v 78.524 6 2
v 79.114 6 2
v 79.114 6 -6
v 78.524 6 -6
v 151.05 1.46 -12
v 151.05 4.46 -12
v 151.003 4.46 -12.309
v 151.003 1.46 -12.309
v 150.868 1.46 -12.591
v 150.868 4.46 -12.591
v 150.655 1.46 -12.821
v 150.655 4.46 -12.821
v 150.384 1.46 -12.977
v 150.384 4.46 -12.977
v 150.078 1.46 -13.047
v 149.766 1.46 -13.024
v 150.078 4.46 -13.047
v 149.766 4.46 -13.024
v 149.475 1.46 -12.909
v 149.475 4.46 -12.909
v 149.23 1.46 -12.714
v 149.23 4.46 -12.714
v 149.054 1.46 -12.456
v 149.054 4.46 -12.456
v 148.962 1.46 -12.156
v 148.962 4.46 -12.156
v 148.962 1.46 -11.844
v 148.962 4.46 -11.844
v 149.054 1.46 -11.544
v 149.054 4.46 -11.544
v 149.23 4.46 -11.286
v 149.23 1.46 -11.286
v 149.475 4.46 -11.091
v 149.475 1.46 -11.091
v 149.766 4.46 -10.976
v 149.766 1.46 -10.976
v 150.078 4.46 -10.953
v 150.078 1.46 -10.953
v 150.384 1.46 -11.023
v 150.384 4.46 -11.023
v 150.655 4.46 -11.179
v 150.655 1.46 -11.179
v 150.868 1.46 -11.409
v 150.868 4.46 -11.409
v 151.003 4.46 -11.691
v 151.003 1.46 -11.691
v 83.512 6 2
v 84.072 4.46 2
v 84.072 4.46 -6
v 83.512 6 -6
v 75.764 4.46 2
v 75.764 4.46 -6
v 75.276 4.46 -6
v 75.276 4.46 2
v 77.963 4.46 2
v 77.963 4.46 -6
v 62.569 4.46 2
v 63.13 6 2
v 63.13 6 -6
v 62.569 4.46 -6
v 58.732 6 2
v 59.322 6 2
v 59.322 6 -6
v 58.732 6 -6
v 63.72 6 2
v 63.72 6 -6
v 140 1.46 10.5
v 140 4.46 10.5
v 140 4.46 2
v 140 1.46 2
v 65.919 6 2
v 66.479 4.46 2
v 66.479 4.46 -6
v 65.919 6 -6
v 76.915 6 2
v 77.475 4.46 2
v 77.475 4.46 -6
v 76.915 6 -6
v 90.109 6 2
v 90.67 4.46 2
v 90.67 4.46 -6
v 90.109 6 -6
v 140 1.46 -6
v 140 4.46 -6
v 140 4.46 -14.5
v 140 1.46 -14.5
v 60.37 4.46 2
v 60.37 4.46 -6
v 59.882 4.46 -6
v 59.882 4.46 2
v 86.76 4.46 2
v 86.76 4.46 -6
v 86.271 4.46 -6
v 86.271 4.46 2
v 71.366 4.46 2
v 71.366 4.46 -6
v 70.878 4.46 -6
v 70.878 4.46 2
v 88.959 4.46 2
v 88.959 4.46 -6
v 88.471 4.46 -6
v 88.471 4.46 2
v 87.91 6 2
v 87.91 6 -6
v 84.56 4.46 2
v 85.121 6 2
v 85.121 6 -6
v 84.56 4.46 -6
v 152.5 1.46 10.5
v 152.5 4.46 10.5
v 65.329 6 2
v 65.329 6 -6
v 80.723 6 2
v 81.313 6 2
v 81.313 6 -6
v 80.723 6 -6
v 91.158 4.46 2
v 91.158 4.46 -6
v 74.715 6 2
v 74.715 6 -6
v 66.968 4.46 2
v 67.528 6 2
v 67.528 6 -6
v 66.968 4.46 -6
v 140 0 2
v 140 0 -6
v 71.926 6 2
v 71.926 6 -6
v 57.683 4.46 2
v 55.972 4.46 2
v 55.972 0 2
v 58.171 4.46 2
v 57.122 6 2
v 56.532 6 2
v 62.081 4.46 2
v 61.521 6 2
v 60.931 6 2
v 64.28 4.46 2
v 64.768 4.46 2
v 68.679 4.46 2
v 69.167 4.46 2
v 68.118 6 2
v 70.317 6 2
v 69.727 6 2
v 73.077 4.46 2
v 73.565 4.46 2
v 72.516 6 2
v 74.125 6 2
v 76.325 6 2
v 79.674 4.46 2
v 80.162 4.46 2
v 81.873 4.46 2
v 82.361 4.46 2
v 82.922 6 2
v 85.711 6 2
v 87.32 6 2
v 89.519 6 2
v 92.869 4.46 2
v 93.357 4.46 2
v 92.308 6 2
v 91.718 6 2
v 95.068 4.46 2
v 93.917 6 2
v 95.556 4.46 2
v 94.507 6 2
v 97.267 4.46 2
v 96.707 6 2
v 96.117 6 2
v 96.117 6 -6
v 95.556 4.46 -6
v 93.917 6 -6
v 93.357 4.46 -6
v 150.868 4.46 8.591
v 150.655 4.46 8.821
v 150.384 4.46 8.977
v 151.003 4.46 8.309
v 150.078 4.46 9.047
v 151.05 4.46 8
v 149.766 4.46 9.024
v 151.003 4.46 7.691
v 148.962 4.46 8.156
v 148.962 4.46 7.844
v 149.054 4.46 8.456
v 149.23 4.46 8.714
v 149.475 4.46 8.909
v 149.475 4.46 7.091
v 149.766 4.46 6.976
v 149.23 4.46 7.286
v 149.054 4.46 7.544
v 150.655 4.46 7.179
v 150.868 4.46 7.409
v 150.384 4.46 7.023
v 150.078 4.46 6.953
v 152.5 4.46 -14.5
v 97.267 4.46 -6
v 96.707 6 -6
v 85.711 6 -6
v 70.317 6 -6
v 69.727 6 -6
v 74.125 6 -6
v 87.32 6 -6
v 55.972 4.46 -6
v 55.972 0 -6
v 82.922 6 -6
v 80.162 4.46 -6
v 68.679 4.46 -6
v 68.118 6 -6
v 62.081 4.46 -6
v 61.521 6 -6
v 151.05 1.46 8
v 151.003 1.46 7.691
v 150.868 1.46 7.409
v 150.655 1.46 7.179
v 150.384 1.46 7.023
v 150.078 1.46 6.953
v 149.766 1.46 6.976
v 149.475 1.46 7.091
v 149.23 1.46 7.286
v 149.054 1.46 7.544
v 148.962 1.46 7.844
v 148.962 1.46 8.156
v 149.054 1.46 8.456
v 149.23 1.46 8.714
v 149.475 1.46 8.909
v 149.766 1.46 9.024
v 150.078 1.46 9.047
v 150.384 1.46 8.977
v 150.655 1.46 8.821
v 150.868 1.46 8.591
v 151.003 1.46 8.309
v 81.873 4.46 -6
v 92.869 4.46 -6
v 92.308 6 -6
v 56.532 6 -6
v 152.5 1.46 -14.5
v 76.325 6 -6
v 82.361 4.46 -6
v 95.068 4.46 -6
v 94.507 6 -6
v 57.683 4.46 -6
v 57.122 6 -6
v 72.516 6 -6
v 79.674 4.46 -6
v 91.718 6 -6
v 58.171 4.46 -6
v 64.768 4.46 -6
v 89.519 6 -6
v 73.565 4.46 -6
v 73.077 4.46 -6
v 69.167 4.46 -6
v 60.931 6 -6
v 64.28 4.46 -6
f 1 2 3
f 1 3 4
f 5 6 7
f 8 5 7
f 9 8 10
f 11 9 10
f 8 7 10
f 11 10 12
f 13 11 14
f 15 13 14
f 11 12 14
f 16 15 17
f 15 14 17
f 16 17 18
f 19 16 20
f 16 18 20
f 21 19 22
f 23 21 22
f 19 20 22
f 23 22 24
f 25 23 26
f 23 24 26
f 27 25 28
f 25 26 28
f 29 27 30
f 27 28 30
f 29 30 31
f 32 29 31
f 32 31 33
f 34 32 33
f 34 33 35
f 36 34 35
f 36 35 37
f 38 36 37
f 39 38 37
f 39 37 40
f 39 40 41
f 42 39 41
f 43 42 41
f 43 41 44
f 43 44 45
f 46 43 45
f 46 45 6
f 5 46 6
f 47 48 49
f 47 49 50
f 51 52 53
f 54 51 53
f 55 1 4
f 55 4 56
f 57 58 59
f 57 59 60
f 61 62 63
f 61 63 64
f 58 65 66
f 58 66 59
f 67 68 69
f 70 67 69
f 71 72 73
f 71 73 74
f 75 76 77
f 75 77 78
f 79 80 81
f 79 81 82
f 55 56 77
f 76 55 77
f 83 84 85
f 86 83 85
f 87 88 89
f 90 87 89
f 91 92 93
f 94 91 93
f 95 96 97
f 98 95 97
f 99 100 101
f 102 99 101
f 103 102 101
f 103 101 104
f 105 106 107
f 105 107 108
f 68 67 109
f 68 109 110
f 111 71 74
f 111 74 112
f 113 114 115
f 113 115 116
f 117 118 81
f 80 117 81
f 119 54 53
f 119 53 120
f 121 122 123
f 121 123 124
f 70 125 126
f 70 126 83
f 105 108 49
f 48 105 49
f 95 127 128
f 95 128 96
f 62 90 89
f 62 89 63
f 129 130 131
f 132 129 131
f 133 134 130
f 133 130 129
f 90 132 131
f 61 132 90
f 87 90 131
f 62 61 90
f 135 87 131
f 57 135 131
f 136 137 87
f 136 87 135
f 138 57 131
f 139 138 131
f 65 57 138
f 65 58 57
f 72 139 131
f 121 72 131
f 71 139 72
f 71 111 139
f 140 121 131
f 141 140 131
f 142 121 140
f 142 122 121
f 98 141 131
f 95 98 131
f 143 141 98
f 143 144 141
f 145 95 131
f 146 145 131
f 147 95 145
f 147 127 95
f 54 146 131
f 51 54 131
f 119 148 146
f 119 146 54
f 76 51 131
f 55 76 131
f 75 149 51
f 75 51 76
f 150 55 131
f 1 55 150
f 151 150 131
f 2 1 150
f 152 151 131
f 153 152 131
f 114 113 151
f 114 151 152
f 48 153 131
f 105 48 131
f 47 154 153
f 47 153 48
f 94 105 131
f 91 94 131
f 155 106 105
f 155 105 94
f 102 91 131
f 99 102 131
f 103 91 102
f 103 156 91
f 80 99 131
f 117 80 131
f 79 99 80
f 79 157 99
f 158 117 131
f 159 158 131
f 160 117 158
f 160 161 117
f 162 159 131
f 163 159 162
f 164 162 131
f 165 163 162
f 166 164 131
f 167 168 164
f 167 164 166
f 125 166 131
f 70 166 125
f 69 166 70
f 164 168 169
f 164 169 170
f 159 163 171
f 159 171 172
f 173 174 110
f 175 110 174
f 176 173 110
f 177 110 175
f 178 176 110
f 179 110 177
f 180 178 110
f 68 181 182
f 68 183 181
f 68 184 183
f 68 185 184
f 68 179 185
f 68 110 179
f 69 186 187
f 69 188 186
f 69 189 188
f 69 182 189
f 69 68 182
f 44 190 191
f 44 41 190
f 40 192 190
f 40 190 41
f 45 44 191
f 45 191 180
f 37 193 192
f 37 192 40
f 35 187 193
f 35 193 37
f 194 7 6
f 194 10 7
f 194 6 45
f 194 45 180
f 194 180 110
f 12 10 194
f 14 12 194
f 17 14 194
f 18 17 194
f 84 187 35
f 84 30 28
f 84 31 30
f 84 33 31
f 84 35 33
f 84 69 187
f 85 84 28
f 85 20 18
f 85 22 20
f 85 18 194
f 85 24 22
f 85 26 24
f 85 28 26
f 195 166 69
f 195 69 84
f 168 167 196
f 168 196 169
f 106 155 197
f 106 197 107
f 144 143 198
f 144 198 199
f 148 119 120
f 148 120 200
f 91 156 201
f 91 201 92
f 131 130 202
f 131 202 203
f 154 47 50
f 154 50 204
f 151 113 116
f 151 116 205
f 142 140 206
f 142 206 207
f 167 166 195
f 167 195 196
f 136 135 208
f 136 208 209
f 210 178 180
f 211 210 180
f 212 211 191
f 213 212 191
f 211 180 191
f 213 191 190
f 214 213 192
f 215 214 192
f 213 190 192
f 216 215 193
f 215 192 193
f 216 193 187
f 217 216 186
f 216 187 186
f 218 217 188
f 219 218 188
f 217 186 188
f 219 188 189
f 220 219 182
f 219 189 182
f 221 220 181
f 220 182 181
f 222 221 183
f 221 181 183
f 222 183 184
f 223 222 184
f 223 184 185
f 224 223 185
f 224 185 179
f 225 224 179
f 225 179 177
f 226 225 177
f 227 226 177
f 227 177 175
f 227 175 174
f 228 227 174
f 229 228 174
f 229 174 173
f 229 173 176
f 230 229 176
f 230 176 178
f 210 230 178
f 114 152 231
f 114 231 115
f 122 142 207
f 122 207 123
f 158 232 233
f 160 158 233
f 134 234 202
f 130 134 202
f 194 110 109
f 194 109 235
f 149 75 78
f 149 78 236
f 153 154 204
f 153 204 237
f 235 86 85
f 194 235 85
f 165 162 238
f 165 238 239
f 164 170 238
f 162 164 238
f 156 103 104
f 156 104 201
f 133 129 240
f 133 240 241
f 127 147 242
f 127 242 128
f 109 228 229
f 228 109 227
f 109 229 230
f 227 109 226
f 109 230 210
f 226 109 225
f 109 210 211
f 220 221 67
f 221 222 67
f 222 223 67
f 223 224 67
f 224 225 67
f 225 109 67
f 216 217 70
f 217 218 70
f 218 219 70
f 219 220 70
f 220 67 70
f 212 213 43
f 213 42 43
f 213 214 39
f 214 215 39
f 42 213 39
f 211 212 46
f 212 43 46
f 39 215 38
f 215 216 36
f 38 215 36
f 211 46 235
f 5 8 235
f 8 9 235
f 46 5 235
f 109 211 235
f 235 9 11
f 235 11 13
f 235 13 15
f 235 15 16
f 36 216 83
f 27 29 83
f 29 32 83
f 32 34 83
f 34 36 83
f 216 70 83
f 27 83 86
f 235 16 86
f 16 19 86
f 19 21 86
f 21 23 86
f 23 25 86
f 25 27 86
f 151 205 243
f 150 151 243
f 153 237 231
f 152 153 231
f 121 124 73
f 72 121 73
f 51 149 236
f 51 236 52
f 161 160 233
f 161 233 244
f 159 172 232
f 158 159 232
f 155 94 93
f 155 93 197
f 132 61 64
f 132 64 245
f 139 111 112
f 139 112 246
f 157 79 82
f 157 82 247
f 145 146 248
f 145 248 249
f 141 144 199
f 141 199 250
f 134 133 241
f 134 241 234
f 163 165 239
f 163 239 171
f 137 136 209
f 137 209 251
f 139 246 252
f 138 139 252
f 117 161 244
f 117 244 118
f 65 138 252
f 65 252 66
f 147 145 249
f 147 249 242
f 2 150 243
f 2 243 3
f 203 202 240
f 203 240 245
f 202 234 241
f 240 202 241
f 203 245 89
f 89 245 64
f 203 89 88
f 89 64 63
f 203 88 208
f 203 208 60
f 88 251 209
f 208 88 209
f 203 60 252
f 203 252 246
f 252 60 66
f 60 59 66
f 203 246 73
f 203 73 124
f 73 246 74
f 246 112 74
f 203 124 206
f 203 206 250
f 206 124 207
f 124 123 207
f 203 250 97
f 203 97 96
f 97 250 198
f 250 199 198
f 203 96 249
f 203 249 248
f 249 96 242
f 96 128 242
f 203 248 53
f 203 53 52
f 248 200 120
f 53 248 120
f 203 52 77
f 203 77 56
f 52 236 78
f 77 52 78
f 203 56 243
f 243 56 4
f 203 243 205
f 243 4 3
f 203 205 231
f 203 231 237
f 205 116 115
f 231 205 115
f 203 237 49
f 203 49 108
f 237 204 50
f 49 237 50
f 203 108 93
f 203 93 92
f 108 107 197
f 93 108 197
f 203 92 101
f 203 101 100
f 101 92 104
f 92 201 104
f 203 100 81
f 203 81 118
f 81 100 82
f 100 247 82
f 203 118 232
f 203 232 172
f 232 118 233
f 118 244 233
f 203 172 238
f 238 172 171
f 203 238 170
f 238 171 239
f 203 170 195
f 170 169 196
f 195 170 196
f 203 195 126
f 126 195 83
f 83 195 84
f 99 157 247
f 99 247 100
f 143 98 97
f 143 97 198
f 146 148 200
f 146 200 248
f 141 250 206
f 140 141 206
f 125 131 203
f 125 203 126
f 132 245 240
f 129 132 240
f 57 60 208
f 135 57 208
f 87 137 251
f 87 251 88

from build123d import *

# Parameters (mm, degrees)
BOSS_EXTRU_1_DEPTH      = 8
ESQUISSE3_W             = 25
ESQUISSE3_H             = 3
BOSS_EXTRU_3_DEPTH      = 12.5
ESQUISSE4_R             = 1.05
ENL_V_MAT_EXTRU_1_DEPTH = 10
ESQUISSE7_W             = 13.702754964
ESQUISSE7_H             = 7.283651796
ENL_V_MAT_EXTRU_2_DEPTH = 55


with BuildPart() as part:
    # Esquisse1 → Boss.-Extru.1 (new body)
    with BuildSketch(Plane.XY.offset(2)):
        Polygon((55.971983753, 0), (140, 0), (140, 4.46), (139.050191247, 4.46), (138.489677086, 6), (137.899678914, 6), (137.339164753, 4.46), (136.851078247, 4.46), (136.290564086, 6), (135.700565914, 6), (135.140051753, 4.46), (134.651965247, 4.46), (134.091451086, 6), (133.501452914, 6), (132.940938753, 4.46), (132.452852247, 4.46), (131.892338086, 6), (131.302339914, 6), (130.741825753, 4.46), (130.253739247, 4.46), (129.693225086, 6), (129.103226914, 6), (128.542712753, 4.46), (128.054626247, 4.46), (127.494112086, 6), (126.904113914, 6), (126.343599753, 4.46), (125.855513247, 4.46), (125.294999086, 6), (124.705000914, 6), (124.144486753, 4.46), (123.656400247, 4.46), (123.095886086, 6), (122.505887914, 6), (121.945373753, 4.46), (121.457287247, 4.46), (120.896773086, 6), (120.306774914, 6), (119.746260753, 4.46), (119.258174247, 4.46), (118.697660086, 6), (118.107661914, 6), (117.547147753, 4.46), (117.059061247, 4.46), (116.498547086, 6), (115.908548914, 6), (115.348034753, 4.46), (114.859948247, 4.46), (114.299434086, 6), (113.709435914, 6), (113.148921753, 4.46), (112.660835247, 4.46), (112.100321086, 6), (111.510322914, 6), (110.949808753, 4.46), (110.461722247, 4.46), (109.901208086, 6), (109.311209914, 6), (108.750695753, 4.46), (108.262609247, 4.46), (107.702095086, 6), (107.112096914, 6), (106.551582753, 4.46), (106.063496247, 4.46), (105.502982086, 6), (104.912983914, 6), (104.352469753, 4.46), (103.864383247, 4.46), (103.303869086, 6), (102.713870914, 6), (102.153356753, 4.46), (101.665270247, 4.46), (101.104756086, 6), (100.514757914, 6), (99.954243753, 4.46), (99.466157247, 4.46), (98.905643086, 6), (98.315644914, 6), (97.755130753, 4.46), (97.267044247, 4.46), (96.706530086, 6), (96.116531914, 6), (95.556017753, 4.46), (95.067931247, 4.46), (94.507417086, 6), (93.917418914, 6), (93.356904753, 4.46), (92.868818247, 4.46), (92.308304086, 6), (91.718305914, 6), (91.157791753, 4.46), (90.669705247, 4.46), (90.109191086, 6), (89.519192914, 6), (88.958678753, 4.46), (88.470592247, 4.46), (87.910078086, 6), (87.320079914, 6), (86.759565753, 4.46), (86.271479247, 4.46), (85.710965086, 6), (85.120966914, 6), (84.560452753, 4.46), (84.072366247, 4.46), (83.511852086, 6), (82.921853914, 6), (82.361339753, 4.46), (81.873253247, 4.46), (81.312739086, 6), (80.722740914, 6), (80.162226753, 4.46), (79.674140247, 4.46), (79.113626086, 6), (78.523627914, 6), (77.963113753, 4.46), (77.475027247, 4.46), (76.914513086, 6), (76.324514914, 6), (75.764000753, 4.46), (75.275914247, 4.46), (74.715400086, 6), (74.125401914, 6), (73.564887753, 4.46), (73.076801247, 4.46), (72.516287086, 6), (71.926288914, 6), (71.365774753, 4.46), (70.877688247, 4.46), (70.317174086, 6), (69.727175914, 6), (69.166661753, 4.46), (68.678575247, 4.46), (68.118061086, 6), (67.528062914, 6), (66.967548753, 4.46), (66.479462247, 4.46), (65.918948086, 6), (65.328949914, 6), (64.768435753, 4.46), (64.280349247, 4.46), (63.719835086, 6), (63.129836914, 6), (62.569322753, 4.46), (62.081236247, 4.46), (61.520722086, 6), (60.930723914, 6), (60.370209753, 4.46), (59.882123247, 4.46), (59.321609086, 6), (58.731610914, 6), (58.171096753, 4.46), (57.683010247, 4.46), (57.122496086, 6), (56.532497914, 6), (55.971983753, 4.46), align=None)
    extrude(amount=-BOSS_EXTRU_1_DEPTH)

    # Esquisse3 → Boss.-Extru.3 (add)
    with BuildSketch(Plane(origin=(140, 0, 0), x_dir=(0, 0, -1), z_dir=(1, 0, 0))):
        with Locations((2, 2.96)):
            Rectangle(ESQUISSE3_W, ESQUISSE3_H)
    extrude(amount=BOSS_EXTRU_3_DEPTH)

    # Esquisse4 → Enlèv. mat.-Extru.1 (cut)
    with BuildSketch(Plane(origin=(0, 4.46, 0), x_dir=(1, 0, 0), z_dir=(0, 1, 0))):
        with Locations((150, -8)):
            Circle(ESQUISSE4_R)
        with Locations((150, 12)):
            Circle(ESQUISSE4_R)
    extrude(amount=-ENL_V_MAT_EXTRU_1_DEPTH, mode=Mode.SUBTRACT)

    # Esquisse7 → Enlèv. mat.-Extru.2 (cut)
    with BuildSketch(Plane(origin=(152.5, 0, 0), x_dir=(0, 0, -1), z_dir=(1, 0, 0))):
        with Locations((2.202713729, 8.101825898)):
            Rectangle(ESQUISSE7_W, ESQUISSE7_H)
    extrude(amount=-ENL_V_MAT_EXTRU_2_DEPTH, mode=Mode.SUBTRACT)


solid = part.part
